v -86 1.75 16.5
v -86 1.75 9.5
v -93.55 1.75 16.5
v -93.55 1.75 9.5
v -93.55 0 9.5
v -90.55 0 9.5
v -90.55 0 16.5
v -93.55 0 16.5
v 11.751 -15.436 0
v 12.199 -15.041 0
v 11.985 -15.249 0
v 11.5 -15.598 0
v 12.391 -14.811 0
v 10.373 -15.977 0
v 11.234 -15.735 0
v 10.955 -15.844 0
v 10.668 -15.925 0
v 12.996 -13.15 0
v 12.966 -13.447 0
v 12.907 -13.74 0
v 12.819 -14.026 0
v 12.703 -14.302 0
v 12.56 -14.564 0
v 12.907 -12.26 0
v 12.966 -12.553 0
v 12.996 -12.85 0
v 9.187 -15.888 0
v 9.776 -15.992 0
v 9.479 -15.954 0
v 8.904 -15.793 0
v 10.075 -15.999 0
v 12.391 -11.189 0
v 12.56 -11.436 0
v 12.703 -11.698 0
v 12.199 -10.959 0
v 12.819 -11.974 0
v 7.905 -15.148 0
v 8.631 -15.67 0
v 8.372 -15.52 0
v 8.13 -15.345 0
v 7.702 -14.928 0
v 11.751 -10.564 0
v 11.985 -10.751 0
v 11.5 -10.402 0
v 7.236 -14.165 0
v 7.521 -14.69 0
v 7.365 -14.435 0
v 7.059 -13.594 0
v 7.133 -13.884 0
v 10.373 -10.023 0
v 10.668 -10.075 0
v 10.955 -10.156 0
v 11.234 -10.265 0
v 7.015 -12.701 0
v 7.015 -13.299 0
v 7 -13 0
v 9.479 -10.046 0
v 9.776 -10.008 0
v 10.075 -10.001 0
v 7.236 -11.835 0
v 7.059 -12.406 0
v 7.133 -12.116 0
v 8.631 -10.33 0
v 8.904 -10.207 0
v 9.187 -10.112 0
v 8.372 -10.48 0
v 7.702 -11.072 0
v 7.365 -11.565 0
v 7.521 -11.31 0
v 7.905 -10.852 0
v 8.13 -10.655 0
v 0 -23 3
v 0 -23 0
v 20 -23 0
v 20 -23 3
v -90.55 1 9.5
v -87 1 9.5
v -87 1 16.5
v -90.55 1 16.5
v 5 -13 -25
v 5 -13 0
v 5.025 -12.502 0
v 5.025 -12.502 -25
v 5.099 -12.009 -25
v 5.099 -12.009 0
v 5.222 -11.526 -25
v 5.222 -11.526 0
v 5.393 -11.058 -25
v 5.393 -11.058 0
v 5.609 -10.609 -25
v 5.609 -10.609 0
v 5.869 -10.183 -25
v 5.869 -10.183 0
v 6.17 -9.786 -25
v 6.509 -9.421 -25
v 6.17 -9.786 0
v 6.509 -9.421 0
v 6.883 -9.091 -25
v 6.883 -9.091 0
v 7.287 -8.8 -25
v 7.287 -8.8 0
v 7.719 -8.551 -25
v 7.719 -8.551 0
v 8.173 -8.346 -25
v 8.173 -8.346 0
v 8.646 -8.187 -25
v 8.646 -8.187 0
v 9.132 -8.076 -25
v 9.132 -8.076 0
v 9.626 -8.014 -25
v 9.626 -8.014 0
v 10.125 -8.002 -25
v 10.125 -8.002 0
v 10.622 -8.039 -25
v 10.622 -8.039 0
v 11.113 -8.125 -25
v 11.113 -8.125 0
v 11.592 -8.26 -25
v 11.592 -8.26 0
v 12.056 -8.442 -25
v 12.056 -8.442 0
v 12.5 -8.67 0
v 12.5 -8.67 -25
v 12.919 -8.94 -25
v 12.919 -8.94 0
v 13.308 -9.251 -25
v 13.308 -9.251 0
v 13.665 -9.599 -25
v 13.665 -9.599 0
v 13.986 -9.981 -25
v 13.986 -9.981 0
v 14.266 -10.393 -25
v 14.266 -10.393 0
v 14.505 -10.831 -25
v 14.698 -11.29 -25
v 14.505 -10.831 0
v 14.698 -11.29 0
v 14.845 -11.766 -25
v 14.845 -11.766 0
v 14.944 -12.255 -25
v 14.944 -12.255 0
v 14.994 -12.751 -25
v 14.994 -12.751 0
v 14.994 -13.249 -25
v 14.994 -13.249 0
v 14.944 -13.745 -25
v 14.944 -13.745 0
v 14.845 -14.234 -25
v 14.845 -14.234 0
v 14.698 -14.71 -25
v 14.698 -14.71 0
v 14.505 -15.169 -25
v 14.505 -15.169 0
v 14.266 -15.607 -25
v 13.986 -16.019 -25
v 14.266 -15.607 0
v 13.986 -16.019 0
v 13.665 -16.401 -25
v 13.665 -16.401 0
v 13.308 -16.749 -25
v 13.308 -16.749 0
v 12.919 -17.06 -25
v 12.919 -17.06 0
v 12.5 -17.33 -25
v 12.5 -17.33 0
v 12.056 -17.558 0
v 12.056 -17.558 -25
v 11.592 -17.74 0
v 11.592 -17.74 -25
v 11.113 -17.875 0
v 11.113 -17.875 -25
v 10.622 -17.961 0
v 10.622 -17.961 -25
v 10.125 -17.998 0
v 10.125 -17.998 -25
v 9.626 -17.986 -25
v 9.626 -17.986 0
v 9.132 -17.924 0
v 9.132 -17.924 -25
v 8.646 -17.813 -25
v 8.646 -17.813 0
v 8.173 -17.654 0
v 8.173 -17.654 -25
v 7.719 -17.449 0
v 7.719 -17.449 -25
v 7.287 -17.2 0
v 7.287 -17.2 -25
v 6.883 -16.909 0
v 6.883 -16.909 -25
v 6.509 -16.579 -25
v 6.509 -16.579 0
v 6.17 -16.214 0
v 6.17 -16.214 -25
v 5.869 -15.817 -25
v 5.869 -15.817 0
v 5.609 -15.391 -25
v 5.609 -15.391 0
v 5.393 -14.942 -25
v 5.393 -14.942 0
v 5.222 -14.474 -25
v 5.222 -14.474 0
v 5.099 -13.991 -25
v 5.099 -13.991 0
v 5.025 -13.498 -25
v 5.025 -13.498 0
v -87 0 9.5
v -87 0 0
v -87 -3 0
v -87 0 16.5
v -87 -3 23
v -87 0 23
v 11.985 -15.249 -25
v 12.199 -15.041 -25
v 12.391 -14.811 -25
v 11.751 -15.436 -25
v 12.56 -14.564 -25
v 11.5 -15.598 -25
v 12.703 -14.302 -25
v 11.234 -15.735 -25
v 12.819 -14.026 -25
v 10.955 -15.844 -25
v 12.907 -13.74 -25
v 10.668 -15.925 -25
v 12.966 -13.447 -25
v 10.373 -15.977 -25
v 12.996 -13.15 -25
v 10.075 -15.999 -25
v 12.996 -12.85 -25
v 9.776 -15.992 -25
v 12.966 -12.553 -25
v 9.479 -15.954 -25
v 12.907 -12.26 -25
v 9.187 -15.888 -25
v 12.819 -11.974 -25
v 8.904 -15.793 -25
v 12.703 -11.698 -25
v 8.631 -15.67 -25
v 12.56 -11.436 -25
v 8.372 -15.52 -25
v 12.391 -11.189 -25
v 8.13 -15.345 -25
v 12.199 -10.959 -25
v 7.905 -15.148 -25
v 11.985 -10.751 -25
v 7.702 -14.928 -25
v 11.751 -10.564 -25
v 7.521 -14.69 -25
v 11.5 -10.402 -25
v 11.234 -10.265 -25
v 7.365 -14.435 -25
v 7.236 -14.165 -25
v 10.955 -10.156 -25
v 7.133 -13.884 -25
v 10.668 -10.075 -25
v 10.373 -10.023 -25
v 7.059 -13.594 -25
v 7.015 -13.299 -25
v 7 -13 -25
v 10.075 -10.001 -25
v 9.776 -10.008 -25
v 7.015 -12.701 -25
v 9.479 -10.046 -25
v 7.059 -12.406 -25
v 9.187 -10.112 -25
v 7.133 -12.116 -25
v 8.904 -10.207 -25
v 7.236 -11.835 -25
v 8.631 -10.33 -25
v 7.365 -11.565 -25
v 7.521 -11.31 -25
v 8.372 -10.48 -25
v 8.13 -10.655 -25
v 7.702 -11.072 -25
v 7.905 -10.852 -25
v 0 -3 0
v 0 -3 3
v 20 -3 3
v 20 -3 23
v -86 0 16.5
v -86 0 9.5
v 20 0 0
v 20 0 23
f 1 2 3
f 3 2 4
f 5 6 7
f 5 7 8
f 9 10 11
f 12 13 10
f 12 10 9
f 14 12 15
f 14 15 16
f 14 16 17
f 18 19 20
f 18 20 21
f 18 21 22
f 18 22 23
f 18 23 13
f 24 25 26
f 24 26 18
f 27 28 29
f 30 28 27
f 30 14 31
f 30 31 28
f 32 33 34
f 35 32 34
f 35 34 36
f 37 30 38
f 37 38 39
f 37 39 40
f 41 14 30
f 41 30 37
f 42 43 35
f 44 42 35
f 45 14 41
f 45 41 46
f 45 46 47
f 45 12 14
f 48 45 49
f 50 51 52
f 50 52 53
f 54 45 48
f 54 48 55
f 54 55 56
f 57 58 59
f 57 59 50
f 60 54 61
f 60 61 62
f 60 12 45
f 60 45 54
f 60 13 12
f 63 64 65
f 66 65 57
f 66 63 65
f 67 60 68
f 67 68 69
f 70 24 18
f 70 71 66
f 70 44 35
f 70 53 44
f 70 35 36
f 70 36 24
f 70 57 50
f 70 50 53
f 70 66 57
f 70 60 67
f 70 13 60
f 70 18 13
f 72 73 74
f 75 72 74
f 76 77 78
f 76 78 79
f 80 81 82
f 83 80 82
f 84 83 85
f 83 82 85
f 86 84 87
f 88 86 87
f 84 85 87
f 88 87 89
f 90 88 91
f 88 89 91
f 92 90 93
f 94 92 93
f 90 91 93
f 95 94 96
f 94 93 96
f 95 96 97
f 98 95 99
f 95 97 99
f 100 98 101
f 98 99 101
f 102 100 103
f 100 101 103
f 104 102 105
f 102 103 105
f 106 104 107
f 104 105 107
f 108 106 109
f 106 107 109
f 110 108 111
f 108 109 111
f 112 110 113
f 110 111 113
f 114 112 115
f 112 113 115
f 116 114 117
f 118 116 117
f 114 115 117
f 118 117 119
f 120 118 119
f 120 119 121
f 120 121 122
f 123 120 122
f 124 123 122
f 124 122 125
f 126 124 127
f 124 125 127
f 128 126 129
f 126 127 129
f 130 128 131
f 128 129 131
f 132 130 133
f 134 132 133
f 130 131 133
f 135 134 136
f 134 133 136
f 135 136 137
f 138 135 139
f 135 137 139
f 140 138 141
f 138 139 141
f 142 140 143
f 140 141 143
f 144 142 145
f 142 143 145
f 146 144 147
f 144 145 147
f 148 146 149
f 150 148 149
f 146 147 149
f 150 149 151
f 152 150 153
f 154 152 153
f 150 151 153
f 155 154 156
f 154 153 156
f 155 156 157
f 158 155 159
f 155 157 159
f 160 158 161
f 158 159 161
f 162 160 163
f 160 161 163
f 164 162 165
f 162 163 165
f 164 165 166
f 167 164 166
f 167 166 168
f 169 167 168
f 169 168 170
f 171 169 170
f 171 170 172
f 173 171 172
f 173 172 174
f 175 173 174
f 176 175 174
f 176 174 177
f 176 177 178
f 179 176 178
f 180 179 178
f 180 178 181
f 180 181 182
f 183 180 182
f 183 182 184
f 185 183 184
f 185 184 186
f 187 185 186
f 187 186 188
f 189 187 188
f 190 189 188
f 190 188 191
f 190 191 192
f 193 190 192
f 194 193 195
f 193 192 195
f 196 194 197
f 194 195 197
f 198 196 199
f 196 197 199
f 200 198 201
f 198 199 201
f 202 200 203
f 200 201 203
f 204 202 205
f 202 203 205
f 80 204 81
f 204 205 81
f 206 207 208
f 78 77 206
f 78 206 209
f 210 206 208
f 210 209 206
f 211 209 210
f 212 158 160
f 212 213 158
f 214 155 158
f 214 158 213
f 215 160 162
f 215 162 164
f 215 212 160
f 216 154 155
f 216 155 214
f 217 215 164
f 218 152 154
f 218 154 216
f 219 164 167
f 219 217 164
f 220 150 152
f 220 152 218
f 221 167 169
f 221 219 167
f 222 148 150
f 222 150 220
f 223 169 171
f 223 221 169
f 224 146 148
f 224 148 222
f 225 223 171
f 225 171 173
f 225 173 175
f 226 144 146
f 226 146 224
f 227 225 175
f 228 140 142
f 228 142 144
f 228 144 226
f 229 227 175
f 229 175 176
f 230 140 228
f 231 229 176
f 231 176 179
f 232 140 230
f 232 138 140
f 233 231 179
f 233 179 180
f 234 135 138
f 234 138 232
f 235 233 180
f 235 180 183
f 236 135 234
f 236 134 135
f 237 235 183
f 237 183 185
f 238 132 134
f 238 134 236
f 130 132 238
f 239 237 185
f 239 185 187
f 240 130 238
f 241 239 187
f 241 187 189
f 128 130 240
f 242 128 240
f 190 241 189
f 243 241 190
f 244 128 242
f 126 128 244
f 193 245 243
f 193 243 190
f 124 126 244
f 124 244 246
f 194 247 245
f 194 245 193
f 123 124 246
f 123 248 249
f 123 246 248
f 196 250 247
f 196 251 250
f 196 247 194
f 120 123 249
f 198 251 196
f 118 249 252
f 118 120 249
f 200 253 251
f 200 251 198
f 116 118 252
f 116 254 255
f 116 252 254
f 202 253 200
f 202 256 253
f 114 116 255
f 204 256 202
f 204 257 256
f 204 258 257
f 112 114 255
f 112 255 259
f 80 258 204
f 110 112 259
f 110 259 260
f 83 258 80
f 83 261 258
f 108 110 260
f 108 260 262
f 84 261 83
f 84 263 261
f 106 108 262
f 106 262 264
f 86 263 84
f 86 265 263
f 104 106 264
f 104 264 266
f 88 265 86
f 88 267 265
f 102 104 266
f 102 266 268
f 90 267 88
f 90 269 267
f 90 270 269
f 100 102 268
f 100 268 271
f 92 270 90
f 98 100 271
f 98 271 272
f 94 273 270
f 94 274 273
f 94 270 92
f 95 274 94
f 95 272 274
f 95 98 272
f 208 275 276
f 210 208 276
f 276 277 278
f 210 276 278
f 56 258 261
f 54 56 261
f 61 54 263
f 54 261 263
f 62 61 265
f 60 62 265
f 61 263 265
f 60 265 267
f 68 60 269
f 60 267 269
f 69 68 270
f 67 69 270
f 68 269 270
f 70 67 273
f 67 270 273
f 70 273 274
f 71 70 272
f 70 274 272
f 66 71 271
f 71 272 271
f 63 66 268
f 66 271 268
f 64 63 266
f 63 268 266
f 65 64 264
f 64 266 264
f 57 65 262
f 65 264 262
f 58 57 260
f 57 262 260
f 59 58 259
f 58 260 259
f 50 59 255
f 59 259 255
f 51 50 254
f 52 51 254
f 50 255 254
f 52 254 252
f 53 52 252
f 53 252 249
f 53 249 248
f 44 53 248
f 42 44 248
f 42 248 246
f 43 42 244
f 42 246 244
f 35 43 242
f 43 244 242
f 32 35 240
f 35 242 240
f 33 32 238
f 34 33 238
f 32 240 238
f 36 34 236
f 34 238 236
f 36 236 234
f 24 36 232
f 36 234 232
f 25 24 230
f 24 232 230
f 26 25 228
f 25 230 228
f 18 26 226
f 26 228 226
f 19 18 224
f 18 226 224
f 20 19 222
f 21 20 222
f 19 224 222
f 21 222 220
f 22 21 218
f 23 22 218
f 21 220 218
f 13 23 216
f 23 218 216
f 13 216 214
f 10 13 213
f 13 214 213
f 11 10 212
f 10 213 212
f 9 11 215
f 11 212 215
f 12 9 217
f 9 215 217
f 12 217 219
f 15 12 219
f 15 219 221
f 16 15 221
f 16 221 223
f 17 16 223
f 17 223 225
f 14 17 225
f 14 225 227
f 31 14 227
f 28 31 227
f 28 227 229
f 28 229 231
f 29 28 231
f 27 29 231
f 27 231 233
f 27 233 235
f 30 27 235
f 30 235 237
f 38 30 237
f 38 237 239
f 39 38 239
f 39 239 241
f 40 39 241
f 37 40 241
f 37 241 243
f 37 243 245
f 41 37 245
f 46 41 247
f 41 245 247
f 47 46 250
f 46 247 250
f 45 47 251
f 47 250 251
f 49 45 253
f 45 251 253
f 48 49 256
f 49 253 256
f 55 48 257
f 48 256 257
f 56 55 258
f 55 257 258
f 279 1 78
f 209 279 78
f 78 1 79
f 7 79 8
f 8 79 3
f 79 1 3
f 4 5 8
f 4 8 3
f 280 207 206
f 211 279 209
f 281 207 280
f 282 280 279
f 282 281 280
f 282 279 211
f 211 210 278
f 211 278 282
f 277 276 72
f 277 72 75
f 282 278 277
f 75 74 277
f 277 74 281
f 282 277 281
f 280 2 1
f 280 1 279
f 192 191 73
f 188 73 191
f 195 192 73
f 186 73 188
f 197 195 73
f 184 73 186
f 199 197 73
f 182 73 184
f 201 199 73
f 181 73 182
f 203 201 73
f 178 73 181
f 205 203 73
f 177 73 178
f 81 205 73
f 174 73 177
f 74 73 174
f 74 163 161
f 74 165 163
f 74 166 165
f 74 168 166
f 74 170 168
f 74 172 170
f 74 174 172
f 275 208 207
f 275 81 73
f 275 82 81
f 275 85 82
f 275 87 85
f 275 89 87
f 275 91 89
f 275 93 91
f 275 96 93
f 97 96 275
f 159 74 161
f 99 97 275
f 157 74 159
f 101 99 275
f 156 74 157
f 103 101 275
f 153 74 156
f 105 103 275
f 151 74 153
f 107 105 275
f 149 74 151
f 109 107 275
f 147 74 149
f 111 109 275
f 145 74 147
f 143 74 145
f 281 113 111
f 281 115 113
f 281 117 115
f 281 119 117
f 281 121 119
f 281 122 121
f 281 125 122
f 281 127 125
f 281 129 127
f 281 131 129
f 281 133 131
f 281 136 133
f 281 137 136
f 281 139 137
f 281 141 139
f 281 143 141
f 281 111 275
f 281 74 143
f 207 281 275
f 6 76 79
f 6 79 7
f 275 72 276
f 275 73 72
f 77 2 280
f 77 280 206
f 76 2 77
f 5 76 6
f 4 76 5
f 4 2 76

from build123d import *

# Parameters (mm, degrees)
SKETCH1_W                = 20
SKETCH1_H                = 23
BOSS_EXTRUDE1_DEPTH      = 3
SKETCH2_W                = 20
SKETCH2_H                = 3
BOSS_EXTRUDE2_DEPTH      = 20
SKETCH3_R                = 5
BOSS_EXTRUDE3_DEPTH      = 25
SKETCH4_R                = 3
CUT_EXTRUDE1_DEPTH       = 25
SKETCH5_W                = 23
SKETCH5_H                = 3
BOSS_EXTRUDE4_DEPTH      = 87
BOSS_EXTRUDE5_DEPTH      = 5
BOSS_EXTRUDE5_DEPTH_BACK = 2
BOSS_EXTRUDE5_START      = 11.5


with BuildPart() as part:
    # Sketch1 → Boss-Extrude1 (new body)
    with BuildSketch(Plane.XY):
        with Locations((10, -11.5)):
            Rectangle(SKETCH1_W, SKETCH1_H)
    extrude(amount=BOSS_EXTRUDE1_DEPTH)

    # Sketch2 → Boss-Extrude2 (add)
    with BuildSketch(Plane.XY.offset(3)):
        with Locations((10, -1.5)):
            Rectangle(SKETCH2_W, SKETCH2_H)
    extrude(amount=BOSS_EXTRUDE2_DEPTH)

    # Sketch3 → Boss-Extrude3 (add)
    with BuildSketch(Plane(origin=(0, 0, 0), x_dir=(-1, 0, 0), z_dir=(0, 0, -1))):
        with Locations((-10, -13)):
            Circle(SKETCH3_R)
    extrude(amount=BOSS_EXTRUDE3_DEPTH)

    # Sketch4 → Cut-Extrude1 (cut)
    with BuildSketch(Plane(origin=(0, 0, -25), x_dir=(-1, 0, 0), z_dir=(0, 0, -1))):
        with Locations((-10, -13)):
            Circle(SKETCH4_R)
    extrude(amount=-CUT_EXTRUDE1_DEPTH, mode=Mode.SUBTRACT)

    # Sketch5 → Boss-Extrude4 (add)
    with BuildSketch(Plane.ZY):
        with Locations((11.5, -1.5)):
            Rectangle(SKETCH5_W, SKETCH5_H)
    extrude(amount=BOSS_EXTRUDE4_DEPTH)

    # Sketch8 → Boss-Extrude5 (add, two sides: drawn at the far end of the back side and taken through both)
    with BuildSketch(Plane.XY.offset(BOSS_EXTRUDE5_START - BOSS_EXTRUDE5_DEPTH_BACK)):
        Polygon((-87, 0), (-87, 1), (-90.55, 1), (-90.55, 0), (-93.55, 0), (-93.55, 1.75), (-90.55, 1.75), (-86, 1.75), (-86, 0), align=None)
    extrude(amount=BOSS_EXTRUDE5_DEPTH + BOSS_EXTRUDE5_DEPTH_BACK)


solid = part.part
